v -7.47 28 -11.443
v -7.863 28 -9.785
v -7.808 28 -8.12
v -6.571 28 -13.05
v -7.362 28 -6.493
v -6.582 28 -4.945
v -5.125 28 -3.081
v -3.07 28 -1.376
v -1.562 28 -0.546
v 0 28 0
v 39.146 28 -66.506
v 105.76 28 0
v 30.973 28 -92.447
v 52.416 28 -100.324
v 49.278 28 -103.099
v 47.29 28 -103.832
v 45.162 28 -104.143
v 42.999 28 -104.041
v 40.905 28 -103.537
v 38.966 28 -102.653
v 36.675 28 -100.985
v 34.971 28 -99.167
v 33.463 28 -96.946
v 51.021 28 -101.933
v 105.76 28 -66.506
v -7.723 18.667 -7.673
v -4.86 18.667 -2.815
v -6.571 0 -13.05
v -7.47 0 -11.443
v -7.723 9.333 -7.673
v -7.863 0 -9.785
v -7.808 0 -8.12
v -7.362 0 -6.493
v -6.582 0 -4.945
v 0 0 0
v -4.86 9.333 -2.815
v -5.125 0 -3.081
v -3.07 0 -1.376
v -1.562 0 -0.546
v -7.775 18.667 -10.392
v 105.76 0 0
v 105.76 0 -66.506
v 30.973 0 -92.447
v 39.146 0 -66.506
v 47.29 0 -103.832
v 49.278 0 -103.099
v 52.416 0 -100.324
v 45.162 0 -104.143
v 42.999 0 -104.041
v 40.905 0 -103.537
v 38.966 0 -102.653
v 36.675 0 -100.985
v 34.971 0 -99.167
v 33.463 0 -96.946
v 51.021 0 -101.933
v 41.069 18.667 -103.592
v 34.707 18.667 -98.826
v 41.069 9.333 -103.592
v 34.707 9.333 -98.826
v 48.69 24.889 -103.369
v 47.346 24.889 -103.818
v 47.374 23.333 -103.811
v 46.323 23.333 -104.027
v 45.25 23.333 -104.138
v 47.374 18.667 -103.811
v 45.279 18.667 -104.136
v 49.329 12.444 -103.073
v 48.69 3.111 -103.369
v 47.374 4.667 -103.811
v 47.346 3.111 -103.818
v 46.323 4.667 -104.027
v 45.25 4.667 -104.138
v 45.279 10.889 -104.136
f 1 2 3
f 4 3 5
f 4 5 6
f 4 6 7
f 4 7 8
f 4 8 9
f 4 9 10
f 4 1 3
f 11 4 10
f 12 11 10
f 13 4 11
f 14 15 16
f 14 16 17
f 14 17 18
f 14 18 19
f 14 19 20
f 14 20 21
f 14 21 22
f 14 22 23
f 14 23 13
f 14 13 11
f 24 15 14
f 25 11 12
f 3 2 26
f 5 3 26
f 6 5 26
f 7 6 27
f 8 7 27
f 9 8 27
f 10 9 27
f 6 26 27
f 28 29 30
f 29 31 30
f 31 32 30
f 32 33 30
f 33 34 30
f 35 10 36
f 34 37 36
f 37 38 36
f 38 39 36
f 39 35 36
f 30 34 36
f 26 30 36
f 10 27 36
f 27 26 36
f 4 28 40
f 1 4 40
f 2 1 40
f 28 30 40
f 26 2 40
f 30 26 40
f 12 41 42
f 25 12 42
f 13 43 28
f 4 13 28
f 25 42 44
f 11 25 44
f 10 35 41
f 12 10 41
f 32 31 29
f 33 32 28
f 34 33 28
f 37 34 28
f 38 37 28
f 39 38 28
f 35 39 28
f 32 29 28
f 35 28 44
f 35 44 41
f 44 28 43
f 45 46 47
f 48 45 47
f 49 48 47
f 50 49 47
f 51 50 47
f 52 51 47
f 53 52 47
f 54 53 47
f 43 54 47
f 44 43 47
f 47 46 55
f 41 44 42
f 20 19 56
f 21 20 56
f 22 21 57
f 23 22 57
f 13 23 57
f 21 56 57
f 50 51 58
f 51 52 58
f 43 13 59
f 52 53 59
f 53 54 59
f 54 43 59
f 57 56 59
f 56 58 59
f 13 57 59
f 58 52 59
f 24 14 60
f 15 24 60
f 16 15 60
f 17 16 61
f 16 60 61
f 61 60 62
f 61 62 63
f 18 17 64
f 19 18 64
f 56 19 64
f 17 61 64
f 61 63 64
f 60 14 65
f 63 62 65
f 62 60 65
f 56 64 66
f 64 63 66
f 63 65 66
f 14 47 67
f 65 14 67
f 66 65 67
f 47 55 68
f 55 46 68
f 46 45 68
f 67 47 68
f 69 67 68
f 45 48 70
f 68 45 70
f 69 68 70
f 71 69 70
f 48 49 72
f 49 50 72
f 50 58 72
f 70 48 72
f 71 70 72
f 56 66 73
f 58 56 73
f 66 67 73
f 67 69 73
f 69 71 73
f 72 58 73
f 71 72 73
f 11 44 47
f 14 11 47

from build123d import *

# Parameters (mm, degrees)
BOSS_EXTRUDE1_DEPTH = 28


with BuildPart() as part:
    # Sketch1 → Boss-Extrude1 (new body)
    with BuildSketch(Plane(origin=(0, 0, 0), x_dir=(1, 0, 0), z_dir=(0, 1, 0))):
        with BuildLine():
            Line((0, 0), (105.760379504, 0))
            Line((105.760379504, 0), (105.760379504, 66.505760117))
            Line((105.760379504, 66.505760117), (39.146479939, 66.505760117))
            Line((39.146479939, 66.505760117), (52.415736455, 100.323934711))
            add(Edge.make_bspline(
                [(52.415736455, 100.323934711), (50.07713871, 103.942471785), (41.897556232, 105.536469955), (34.280133355, 99.294275572), (32.228567822, 94.566792302), (30.972636221, 92.447002695)],
                knots=[0, 0, 0, 0, 0.447115865, 0.733607522, 1, 1, 1, 1], degree=3))
            Line((30.972636221, 92.447002695), (-6.571045616, 13.050137499))
            add(Edge.make_bspline(
                [(-6.571045616, 13.050137499), (-10.402799403, 7.920582359), (-5.185472177, 1.285466499), (0, 0)],
                knots=[0, 0, 0, 0, 1, 1, 1, 1], degree=3))
        make_face()
    extrude(amount=BOSS_EXTRUDE1_DEPTH)


solid = part.part
